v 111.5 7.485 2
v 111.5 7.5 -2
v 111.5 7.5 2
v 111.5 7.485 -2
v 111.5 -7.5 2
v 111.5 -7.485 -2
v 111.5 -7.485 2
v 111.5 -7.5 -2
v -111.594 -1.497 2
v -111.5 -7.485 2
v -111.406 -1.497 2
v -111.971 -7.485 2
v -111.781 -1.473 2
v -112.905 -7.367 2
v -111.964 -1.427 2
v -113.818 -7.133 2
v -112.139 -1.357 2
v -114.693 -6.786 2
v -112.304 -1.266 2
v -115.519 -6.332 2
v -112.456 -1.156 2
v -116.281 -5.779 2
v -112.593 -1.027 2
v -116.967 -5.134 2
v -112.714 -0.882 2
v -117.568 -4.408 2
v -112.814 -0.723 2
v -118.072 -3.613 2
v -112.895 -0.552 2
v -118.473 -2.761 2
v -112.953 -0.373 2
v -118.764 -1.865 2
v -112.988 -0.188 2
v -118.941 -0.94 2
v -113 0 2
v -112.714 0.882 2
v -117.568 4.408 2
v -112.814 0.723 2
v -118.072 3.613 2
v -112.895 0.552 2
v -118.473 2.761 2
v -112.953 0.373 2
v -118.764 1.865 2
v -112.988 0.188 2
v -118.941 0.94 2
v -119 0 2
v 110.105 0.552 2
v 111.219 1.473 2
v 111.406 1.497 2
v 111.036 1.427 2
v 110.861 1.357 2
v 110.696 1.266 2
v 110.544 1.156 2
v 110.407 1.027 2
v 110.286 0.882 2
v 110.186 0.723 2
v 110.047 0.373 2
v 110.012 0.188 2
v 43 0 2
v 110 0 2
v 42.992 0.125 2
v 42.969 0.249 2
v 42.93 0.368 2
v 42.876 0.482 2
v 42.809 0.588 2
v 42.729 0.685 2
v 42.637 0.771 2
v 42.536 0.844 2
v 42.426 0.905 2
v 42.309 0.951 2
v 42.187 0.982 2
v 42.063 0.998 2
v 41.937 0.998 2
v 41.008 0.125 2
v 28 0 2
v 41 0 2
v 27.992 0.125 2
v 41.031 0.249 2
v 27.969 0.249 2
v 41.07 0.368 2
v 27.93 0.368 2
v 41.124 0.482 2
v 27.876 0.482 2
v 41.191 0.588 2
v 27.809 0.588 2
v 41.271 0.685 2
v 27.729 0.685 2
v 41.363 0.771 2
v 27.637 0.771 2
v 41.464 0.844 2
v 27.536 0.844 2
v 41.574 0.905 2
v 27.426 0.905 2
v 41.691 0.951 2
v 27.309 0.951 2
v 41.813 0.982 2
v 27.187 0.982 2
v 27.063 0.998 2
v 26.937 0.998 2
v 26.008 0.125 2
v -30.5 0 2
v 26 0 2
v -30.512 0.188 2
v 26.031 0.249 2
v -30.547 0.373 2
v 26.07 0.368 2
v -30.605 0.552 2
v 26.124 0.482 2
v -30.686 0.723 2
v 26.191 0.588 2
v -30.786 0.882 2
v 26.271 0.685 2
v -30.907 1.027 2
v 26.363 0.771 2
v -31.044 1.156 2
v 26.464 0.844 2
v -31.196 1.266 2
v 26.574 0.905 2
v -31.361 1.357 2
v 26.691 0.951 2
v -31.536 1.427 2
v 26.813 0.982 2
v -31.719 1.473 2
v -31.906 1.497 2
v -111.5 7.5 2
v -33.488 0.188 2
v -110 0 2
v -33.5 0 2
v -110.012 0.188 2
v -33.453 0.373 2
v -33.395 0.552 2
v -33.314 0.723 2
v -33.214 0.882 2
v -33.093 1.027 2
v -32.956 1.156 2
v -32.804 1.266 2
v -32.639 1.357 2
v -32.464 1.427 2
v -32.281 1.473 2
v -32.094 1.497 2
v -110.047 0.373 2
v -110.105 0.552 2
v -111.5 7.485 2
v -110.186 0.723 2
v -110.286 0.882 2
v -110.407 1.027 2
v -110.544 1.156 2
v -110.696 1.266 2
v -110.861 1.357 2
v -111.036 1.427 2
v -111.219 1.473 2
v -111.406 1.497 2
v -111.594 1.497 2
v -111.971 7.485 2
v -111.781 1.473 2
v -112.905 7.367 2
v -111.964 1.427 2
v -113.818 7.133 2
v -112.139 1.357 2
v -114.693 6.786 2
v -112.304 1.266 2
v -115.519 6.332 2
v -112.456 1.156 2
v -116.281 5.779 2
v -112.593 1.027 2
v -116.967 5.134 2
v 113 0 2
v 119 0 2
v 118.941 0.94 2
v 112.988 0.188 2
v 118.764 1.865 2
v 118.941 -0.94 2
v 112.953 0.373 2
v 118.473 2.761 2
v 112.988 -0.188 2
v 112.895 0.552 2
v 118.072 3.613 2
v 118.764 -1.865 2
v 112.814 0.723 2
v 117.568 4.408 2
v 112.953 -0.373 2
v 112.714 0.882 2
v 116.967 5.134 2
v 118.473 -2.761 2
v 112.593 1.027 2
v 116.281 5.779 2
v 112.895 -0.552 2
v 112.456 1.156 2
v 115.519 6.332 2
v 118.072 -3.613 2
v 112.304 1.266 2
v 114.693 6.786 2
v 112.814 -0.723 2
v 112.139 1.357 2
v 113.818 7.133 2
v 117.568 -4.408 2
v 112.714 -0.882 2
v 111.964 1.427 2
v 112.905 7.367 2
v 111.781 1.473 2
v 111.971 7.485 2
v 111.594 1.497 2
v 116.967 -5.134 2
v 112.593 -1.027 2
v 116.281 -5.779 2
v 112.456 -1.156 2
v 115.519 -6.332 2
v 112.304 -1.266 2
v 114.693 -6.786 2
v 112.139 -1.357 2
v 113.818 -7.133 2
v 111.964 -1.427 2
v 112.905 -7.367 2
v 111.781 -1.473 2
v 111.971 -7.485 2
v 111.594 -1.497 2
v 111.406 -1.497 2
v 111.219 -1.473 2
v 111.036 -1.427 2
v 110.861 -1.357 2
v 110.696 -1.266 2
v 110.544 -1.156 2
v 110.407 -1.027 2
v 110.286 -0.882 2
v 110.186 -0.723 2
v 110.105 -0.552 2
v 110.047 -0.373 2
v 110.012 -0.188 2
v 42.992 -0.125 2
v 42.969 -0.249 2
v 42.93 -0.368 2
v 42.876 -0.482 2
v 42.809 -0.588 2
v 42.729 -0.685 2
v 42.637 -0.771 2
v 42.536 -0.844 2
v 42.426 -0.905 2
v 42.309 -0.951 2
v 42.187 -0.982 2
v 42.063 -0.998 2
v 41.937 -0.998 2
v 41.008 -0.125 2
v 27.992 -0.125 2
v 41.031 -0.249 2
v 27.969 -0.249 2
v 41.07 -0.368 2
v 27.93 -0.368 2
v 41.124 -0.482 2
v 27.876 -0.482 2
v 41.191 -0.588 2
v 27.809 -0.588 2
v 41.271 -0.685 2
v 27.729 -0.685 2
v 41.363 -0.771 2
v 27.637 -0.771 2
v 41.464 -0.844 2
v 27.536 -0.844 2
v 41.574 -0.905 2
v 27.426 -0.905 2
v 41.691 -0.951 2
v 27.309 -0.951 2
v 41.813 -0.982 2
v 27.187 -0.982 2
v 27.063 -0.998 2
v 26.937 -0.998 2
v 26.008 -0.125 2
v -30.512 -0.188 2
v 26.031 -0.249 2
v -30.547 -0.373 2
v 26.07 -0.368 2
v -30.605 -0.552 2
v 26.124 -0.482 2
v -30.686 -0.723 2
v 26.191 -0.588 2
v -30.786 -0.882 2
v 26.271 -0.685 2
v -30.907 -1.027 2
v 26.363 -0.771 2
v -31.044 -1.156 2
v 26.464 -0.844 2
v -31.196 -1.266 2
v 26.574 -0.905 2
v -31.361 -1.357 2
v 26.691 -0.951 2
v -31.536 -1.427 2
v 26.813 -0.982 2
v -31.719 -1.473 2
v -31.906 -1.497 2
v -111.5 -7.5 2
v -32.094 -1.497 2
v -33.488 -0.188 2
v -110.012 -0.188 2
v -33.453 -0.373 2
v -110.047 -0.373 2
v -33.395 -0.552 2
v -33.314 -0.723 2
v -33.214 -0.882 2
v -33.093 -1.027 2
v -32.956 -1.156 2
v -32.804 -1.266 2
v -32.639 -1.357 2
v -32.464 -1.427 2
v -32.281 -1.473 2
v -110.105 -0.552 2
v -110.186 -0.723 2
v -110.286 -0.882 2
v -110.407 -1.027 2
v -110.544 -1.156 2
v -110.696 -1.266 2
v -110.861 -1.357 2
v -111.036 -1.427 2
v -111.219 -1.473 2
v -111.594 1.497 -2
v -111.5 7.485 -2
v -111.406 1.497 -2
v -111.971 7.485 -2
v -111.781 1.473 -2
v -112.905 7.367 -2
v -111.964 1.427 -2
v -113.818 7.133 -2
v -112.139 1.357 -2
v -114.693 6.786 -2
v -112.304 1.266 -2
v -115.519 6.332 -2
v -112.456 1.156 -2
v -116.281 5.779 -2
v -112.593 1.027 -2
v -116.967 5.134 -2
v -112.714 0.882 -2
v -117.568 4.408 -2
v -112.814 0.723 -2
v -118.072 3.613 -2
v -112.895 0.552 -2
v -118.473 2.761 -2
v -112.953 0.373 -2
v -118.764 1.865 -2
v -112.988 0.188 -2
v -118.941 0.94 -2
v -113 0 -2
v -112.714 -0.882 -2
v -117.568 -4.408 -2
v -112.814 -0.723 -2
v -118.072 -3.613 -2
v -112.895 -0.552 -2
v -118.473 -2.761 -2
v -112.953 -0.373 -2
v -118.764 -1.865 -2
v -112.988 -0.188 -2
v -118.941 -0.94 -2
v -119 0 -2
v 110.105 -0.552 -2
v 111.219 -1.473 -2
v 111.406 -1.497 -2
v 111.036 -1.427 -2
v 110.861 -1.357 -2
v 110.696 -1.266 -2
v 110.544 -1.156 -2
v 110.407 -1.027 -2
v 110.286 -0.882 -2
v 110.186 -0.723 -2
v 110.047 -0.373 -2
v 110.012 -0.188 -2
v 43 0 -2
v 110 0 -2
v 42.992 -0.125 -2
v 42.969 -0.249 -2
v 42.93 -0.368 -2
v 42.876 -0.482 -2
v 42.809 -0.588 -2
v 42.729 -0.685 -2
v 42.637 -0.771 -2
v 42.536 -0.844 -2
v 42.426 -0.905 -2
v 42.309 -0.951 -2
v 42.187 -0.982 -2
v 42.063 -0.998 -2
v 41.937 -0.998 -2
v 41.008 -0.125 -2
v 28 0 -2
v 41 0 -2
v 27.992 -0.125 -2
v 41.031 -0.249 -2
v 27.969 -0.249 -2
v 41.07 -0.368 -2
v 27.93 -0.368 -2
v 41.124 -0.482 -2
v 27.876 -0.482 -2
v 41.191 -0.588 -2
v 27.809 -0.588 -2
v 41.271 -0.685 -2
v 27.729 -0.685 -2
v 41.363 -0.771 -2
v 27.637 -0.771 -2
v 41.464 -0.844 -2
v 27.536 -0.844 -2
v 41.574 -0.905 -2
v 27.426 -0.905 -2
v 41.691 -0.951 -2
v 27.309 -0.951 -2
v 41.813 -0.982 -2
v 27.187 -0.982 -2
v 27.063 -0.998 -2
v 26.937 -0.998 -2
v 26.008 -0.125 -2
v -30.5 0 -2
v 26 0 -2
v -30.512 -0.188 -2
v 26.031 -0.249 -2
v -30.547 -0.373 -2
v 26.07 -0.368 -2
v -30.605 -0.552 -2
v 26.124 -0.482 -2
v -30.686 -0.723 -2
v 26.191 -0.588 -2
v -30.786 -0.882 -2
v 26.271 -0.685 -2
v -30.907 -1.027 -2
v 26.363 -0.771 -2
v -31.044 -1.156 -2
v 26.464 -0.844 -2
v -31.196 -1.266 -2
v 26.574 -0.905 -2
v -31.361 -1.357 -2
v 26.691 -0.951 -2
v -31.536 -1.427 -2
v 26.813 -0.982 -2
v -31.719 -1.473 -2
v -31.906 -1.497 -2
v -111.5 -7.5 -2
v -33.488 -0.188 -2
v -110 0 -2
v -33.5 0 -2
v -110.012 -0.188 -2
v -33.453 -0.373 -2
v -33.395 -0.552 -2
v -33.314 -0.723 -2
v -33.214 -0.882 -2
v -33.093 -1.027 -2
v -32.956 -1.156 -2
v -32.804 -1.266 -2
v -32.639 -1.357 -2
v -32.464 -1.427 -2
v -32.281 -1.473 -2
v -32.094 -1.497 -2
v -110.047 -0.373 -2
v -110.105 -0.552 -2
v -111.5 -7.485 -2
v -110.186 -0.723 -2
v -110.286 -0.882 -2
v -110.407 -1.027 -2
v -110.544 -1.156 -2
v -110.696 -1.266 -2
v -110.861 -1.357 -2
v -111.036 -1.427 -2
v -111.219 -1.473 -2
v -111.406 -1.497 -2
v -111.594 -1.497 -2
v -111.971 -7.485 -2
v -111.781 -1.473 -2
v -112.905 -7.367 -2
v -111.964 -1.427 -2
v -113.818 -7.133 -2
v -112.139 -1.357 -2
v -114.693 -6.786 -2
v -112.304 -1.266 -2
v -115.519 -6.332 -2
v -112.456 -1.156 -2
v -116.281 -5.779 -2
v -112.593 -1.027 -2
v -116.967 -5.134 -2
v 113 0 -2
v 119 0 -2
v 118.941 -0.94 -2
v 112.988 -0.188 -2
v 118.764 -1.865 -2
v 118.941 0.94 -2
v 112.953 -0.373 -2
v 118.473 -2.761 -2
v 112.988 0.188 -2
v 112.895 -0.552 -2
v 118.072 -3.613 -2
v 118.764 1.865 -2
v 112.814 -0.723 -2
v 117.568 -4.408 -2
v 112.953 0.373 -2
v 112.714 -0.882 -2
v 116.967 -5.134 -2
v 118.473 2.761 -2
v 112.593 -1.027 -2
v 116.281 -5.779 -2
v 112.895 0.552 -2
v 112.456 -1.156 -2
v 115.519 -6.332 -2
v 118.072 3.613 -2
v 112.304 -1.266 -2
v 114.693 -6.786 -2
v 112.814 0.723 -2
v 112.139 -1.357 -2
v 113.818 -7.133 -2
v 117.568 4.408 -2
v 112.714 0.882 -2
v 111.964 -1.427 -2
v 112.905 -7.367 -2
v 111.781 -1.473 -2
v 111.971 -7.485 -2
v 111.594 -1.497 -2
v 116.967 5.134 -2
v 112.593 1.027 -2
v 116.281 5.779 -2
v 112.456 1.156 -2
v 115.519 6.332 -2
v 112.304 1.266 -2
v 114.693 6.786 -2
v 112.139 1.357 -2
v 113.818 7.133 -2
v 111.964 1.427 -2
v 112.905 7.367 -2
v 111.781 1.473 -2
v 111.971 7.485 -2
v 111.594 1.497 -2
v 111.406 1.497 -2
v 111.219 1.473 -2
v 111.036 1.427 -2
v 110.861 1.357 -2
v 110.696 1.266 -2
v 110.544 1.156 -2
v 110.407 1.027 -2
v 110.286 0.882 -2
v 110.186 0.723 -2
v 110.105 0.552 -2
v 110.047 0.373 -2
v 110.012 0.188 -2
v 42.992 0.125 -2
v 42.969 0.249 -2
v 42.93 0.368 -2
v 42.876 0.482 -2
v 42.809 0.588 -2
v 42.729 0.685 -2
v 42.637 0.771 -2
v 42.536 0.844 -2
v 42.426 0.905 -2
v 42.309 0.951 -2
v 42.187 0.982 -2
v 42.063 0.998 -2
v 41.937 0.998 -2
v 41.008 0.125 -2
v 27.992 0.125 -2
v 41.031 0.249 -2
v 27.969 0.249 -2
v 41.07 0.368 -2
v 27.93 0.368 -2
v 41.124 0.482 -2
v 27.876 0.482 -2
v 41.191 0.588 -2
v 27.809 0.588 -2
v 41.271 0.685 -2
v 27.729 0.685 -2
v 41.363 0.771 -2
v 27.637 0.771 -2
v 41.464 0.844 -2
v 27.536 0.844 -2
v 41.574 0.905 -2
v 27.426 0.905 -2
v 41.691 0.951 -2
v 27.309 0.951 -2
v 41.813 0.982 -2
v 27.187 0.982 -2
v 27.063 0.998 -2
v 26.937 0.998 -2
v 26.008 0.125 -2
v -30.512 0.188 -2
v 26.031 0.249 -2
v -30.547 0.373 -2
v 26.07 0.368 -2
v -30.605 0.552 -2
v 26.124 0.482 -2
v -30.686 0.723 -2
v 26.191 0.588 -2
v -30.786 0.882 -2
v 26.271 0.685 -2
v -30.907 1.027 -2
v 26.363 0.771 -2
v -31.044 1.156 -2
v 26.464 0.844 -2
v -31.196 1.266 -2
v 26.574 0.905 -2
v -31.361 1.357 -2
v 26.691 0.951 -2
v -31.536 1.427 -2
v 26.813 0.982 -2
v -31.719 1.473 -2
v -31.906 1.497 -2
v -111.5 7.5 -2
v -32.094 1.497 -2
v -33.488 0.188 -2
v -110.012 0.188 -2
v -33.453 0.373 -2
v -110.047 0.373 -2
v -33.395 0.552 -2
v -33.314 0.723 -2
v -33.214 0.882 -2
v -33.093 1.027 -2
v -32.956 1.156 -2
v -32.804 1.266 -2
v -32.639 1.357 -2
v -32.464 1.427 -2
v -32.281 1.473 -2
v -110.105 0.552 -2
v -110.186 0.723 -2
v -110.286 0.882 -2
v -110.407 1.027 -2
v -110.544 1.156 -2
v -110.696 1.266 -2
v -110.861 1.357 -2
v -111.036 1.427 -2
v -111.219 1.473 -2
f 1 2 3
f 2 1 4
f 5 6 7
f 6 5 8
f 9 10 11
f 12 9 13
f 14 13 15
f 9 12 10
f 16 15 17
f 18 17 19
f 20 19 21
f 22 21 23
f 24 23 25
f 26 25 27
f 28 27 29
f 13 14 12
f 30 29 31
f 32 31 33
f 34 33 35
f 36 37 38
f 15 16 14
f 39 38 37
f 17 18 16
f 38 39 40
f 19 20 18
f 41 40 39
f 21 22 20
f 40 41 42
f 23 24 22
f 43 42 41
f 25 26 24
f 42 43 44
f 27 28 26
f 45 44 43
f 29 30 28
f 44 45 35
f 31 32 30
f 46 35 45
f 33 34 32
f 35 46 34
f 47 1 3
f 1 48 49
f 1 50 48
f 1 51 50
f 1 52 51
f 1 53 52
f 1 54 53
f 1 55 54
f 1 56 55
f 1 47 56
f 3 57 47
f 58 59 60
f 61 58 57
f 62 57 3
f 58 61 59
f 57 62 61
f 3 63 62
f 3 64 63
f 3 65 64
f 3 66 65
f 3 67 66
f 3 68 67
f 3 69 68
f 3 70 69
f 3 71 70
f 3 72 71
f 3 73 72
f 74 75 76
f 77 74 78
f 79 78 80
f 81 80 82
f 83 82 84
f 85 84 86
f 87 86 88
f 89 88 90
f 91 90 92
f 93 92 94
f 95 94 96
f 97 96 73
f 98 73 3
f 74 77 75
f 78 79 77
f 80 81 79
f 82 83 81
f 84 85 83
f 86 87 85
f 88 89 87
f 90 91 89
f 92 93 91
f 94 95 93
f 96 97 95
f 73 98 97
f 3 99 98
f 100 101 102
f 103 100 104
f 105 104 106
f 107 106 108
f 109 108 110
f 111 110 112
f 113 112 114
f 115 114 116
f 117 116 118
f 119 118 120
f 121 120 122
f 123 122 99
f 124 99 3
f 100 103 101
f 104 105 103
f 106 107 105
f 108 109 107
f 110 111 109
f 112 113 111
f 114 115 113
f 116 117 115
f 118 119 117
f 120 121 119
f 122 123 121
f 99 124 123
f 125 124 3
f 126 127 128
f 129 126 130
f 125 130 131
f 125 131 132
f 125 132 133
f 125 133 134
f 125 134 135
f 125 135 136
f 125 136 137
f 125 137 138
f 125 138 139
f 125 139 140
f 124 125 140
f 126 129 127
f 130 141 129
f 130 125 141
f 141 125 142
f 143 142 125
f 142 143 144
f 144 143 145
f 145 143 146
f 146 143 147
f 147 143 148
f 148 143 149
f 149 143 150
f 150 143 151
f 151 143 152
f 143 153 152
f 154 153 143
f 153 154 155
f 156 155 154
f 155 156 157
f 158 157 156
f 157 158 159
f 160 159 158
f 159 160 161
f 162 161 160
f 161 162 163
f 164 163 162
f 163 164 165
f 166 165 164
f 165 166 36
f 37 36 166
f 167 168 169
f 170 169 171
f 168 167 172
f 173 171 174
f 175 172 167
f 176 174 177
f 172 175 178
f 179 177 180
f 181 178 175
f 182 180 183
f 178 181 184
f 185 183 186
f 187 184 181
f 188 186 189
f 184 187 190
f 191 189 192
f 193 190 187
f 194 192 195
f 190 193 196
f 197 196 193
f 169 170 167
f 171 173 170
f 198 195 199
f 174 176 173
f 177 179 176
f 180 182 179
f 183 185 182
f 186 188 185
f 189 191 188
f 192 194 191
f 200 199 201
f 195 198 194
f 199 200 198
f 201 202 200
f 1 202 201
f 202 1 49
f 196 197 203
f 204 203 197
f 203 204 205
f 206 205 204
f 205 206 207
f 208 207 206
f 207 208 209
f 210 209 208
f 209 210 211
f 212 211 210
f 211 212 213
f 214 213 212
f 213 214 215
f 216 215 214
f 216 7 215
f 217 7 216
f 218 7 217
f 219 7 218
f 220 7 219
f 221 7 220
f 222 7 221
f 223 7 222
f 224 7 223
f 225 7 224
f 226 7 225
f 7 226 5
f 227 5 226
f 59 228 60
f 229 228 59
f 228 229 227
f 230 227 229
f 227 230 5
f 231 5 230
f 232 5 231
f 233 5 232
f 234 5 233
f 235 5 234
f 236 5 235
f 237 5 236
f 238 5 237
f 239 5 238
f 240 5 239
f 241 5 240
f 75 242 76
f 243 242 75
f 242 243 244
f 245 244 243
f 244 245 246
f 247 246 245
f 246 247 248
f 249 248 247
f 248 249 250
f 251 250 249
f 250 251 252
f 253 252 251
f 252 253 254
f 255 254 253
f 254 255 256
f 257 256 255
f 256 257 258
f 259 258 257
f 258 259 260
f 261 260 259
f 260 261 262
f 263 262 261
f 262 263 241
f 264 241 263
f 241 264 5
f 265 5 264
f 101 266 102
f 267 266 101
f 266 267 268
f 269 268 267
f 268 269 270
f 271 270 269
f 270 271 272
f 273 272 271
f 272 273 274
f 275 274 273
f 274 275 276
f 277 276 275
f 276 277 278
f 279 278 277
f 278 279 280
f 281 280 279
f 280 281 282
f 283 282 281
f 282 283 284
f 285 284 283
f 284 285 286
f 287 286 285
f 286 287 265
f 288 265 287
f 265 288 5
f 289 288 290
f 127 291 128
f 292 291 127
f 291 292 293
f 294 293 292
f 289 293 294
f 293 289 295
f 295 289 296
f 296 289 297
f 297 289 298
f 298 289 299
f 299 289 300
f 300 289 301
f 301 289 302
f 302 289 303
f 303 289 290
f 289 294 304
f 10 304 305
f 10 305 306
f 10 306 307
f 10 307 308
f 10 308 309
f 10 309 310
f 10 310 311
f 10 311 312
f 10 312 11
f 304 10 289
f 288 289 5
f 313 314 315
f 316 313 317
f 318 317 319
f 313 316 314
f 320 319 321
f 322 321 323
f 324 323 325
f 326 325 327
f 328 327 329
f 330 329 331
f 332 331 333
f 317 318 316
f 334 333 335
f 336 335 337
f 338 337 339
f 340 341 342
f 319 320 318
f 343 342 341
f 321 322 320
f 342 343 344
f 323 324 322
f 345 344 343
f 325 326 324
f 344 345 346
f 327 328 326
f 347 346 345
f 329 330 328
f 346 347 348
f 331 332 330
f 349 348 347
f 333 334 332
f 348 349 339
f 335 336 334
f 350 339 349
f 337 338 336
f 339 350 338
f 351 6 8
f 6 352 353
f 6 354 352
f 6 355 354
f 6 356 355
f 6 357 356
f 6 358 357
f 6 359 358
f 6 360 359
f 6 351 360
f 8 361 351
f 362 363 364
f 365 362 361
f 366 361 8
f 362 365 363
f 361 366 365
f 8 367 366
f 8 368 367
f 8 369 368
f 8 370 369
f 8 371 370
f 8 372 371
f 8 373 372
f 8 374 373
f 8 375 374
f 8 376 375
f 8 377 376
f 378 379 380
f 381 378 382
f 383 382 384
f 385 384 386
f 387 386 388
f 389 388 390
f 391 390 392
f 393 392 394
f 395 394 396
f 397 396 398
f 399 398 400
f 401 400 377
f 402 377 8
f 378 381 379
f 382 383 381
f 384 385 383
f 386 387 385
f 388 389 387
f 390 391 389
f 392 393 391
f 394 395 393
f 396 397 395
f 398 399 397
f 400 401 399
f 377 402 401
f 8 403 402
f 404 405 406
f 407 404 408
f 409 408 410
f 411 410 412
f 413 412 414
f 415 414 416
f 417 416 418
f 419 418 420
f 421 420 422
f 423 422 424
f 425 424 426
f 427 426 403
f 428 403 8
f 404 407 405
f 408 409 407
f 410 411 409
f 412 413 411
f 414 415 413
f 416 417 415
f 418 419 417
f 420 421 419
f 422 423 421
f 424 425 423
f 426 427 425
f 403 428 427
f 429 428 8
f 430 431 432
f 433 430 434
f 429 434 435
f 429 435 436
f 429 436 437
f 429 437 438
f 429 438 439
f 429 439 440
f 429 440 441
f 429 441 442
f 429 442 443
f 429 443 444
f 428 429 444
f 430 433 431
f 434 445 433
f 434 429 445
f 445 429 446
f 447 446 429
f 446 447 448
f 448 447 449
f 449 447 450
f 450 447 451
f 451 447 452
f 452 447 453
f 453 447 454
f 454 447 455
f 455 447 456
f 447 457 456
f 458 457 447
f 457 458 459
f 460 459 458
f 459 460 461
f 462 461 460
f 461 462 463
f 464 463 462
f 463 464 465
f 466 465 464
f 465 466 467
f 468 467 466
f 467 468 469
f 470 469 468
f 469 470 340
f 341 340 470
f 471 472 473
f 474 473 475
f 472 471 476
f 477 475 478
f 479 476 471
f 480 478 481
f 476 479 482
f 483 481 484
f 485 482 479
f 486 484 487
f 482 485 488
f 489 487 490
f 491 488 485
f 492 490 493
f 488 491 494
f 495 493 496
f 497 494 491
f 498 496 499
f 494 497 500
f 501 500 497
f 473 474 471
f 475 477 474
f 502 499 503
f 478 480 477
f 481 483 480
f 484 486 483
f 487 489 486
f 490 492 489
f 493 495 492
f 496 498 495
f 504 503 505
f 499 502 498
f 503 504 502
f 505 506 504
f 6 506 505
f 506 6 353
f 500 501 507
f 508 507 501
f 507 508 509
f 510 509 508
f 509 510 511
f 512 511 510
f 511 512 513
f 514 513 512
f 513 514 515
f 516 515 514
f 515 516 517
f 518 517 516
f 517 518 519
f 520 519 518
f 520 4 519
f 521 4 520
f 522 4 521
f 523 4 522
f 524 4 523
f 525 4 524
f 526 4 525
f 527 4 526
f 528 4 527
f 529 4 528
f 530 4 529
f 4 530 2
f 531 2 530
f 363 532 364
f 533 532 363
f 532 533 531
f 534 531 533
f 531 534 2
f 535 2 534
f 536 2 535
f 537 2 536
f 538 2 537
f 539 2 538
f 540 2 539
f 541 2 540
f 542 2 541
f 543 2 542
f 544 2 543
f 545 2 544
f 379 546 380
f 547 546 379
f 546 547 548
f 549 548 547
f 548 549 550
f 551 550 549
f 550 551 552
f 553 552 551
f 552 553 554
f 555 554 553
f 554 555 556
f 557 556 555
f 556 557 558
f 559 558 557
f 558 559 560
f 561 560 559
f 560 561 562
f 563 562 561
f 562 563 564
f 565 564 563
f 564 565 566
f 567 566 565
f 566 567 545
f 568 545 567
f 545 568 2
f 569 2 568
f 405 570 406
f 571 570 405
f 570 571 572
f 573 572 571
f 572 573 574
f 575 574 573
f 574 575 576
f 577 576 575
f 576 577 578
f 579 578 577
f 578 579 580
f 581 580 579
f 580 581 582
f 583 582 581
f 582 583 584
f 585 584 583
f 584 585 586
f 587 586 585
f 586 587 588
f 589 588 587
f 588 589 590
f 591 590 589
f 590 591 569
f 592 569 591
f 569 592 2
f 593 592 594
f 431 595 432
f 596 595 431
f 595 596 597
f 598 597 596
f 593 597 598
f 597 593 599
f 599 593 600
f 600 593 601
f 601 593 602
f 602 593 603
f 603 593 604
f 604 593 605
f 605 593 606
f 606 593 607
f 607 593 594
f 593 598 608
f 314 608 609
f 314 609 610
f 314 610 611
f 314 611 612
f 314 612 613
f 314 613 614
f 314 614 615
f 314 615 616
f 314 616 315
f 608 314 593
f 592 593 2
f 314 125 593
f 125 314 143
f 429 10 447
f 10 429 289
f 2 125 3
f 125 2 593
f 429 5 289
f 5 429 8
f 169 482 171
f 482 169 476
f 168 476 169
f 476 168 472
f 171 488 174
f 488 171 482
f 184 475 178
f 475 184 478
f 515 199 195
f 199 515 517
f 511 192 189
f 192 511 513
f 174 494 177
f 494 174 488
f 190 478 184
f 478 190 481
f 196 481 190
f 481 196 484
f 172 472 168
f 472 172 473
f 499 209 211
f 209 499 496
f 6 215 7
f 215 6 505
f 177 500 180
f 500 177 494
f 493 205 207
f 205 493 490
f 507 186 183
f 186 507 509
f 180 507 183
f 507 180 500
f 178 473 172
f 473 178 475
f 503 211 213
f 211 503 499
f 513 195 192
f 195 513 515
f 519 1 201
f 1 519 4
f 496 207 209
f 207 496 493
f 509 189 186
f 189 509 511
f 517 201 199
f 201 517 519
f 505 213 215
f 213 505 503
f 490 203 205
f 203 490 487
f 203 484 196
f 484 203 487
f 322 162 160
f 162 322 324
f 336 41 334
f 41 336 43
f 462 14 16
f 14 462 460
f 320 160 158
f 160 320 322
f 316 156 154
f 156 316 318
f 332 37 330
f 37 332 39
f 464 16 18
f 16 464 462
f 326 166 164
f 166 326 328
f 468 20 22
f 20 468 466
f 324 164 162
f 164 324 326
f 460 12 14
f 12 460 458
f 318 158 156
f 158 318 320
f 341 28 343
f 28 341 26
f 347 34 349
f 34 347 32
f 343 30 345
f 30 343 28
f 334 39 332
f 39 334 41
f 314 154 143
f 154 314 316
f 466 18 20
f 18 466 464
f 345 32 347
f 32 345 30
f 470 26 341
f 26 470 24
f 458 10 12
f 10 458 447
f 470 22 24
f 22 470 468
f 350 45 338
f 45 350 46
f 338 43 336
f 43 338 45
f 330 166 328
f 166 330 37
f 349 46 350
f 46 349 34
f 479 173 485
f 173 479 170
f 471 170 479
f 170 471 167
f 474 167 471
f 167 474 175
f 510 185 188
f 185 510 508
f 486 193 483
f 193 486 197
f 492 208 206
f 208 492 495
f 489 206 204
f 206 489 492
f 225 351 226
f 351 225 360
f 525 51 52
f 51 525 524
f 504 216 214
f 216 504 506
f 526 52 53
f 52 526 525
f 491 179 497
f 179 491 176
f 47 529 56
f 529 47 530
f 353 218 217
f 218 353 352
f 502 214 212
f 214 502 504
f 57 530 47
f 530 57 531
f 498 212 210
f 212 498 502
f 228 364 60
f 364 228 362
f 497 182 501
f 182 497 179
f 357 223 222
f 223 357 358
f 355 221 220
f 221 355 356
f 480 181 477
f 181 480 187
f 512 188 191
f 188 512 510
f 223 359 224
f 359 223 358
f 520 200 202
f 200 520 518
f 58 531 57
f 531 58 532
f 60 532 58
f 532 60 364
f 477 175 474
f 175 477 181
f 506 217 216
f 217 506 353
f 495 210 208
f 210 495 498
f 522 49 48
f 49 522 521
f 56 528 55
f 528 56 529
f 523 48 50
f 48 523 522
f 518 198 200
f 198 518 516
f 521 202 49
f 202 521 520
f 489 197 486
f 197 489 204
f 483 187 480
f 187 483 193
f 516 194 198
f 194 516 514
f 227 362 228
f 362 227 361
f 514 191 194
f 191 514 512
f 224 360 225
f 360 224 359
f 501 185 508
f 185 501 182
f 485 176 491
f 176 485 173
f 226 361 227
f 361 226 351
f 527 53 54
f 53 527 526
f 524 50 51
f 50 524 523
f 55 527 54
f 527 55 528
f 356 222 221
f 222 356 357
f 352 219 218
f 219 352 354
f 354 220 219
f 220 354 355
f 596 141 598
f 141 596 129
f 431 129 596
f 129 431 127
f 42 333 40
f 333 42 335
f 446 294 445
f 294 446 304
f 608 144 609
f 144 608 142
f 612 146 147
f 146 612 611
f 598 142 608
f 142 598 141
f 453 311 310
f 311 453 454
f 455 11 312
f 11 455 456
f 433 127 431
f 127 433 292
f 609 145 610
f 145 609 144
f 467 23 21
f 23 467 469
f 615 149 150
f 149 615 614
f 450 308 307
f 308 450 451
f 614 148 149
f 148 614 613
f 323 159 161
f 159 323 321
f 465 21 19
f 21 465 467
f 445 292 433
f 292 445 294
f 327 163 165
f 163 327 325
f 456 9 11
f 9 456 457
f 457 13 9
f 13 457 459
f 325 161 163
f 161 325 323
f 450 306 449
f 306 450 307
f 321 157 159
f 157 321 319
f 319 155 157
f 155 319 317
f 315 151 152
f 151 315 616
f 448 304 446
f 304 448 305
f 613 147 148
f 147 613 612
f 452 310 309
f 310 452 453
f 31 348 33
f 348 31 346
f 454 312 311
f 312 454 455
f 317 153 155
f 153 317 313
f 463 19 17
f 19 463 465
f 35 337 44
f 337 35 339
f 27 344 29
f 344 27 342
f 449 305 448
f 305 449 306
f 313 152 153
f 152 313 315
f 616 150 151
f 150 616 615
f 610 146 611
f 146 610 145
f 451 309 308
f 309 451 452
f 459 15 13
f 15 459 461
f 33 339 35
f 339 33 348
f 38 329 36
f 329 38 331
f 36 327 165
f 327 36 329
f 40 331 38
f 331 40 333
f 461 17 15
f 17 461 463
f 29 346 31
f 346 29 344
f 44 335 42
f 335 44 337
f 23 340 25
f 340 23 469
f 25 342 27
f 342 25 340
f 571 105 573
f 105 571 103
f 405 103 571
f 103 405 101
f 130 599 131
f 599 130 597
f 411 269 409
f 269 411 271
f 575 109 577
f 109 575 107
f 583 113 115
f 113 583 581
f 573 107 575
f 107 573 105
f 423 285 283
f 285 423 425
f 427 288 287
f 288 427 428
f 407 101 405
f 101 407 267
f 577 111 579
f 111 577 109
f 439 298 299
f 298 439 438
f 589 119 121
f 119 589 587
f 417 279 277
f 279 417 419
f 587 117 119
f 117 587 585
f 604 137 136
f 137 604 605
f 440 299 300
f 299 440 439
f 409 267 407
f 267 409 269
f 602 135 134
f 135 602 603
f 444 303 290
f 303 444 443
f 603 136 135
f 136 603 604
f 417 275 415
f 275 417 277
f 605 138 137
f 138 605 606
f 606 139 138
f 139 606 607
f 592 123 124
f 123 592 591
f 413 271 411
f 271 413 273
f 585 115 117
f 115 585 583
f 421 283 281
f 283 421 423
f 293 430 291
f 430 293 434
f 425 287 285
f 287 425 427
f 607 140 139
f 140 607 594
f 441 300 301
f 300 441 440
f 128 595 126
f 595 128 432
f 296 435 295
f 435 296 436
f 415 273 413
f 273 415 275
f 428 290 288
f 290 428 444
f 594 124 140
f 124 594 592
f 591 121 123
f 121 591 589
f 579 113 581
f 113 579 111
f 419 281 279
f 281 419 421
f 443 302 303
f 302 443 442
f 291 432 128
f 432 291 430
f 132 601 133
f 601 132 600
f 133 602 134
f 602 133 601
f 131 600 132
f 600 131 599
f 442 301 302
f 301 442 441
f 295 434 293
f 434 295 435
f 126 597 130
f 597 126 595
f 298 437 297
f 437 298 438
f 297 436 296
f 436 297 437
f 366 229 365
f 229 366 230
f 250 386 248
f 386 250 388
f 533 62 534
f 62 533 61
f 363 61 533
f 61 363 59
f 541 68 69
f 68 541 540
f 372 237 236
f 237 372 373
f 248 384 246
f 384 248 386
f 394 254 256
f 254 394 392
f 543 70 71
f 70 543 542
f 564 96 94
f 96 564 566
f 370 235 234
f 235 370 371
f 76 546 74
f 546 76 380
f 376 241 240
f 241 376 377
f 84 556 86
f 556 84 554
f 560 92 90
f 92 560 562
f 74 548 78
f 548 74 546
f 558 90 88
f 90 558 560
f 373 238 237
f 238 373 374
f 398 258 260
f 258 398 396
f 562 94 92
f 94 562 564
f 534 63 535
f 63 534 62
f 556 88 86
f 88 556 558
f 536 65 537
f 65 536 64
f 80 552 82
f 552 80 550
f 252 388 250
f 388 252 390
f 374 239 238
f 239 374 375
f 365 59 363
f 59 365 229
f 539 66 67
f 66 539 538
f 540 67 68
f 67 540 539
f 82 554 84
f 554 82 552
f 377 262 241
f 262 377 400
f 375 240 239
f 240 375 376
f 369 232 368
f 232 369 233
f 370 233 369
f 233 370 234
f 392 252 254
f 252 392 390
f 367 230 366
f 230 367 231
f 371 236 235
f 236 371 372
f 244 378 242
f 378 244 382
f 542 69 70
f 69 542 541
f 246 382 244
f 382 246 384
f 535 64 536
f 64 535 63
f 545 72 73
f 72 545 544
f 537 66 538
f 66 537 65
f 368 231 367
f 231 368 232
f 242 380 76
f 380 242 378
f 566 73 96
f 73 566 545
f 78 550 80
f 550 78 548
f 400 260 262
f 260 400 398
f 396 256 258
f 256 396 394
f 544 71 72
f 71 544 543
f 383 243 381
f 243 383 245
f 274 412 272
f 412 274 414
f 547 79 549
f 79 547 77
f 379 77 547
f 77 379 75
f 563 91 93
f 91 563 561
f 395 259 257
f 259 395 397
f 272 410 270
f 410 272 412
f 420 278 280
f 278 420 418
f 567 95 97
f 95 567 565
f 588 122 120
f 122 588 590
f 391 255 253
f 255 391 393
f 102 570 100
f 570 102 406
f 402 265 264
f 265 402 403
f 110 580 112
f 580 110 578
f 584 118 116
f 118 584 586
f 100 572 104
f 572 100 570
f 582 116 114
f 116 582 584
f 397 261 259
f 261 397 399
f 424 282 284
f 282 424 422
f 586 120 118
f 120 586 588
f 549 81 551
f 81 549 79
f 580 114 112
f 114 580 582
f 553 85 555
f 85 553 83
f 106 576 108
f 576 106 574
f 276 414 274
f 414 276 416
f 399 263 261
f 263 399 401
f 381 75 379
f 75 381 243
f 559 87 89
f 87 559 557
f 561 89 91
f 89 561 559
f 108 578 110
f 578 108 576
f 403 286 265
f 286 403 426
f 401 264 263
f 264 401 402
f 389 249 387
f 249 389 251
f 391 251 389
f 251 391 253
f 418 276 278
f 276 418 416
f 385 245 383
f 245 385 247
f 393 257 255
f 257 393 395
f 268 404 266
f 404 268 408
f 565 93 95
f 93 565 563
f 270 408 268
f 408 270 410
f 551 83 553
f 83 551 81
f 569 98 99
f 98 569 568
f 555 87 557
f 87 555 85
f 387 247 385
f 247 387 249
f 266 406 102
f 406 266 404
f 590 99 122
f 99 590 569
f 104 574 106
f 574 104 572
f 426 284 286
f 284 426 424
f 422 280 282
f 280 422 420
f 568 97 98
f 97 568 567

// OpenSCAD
//Author: Piotr Paterek, Kraków 05-08.2016
$fn=50;
module cal()
{
cube([223,15,4], center=true);
translate([223/2,0,0])
                    {
                        cylinder(r=7.5, h=4, center=true);
                    }
                
                translate([-223/2,0,0])
                    {
                        cylinder(r=7.5, h=4, center=true);
                    }
                }
difference()
{
    difference()
    {
        difference()
        {
            difference()
            {
                    difference()
                {
                    cal();
                    translate([223/2,0,0])
                    {
                        cylinder(r=1.5, h=4, center=true);
                    }
                }
                translate([-223/2,0,0])
                    {
                        cylinder(r=1.5, h=4, center=true);
                    }
            }
            translate([-32,0,0])
                    {
                        cylinder(r=1.5, h=4, center=true);
                    }
    }
    translate([42,0,0])
                {
                    cylinder(r=1, h=4, center=true);
                }
            }
            translate([27,0,0])
            {
                cylinder(r=1, h=4, center=true);
            }
        }
